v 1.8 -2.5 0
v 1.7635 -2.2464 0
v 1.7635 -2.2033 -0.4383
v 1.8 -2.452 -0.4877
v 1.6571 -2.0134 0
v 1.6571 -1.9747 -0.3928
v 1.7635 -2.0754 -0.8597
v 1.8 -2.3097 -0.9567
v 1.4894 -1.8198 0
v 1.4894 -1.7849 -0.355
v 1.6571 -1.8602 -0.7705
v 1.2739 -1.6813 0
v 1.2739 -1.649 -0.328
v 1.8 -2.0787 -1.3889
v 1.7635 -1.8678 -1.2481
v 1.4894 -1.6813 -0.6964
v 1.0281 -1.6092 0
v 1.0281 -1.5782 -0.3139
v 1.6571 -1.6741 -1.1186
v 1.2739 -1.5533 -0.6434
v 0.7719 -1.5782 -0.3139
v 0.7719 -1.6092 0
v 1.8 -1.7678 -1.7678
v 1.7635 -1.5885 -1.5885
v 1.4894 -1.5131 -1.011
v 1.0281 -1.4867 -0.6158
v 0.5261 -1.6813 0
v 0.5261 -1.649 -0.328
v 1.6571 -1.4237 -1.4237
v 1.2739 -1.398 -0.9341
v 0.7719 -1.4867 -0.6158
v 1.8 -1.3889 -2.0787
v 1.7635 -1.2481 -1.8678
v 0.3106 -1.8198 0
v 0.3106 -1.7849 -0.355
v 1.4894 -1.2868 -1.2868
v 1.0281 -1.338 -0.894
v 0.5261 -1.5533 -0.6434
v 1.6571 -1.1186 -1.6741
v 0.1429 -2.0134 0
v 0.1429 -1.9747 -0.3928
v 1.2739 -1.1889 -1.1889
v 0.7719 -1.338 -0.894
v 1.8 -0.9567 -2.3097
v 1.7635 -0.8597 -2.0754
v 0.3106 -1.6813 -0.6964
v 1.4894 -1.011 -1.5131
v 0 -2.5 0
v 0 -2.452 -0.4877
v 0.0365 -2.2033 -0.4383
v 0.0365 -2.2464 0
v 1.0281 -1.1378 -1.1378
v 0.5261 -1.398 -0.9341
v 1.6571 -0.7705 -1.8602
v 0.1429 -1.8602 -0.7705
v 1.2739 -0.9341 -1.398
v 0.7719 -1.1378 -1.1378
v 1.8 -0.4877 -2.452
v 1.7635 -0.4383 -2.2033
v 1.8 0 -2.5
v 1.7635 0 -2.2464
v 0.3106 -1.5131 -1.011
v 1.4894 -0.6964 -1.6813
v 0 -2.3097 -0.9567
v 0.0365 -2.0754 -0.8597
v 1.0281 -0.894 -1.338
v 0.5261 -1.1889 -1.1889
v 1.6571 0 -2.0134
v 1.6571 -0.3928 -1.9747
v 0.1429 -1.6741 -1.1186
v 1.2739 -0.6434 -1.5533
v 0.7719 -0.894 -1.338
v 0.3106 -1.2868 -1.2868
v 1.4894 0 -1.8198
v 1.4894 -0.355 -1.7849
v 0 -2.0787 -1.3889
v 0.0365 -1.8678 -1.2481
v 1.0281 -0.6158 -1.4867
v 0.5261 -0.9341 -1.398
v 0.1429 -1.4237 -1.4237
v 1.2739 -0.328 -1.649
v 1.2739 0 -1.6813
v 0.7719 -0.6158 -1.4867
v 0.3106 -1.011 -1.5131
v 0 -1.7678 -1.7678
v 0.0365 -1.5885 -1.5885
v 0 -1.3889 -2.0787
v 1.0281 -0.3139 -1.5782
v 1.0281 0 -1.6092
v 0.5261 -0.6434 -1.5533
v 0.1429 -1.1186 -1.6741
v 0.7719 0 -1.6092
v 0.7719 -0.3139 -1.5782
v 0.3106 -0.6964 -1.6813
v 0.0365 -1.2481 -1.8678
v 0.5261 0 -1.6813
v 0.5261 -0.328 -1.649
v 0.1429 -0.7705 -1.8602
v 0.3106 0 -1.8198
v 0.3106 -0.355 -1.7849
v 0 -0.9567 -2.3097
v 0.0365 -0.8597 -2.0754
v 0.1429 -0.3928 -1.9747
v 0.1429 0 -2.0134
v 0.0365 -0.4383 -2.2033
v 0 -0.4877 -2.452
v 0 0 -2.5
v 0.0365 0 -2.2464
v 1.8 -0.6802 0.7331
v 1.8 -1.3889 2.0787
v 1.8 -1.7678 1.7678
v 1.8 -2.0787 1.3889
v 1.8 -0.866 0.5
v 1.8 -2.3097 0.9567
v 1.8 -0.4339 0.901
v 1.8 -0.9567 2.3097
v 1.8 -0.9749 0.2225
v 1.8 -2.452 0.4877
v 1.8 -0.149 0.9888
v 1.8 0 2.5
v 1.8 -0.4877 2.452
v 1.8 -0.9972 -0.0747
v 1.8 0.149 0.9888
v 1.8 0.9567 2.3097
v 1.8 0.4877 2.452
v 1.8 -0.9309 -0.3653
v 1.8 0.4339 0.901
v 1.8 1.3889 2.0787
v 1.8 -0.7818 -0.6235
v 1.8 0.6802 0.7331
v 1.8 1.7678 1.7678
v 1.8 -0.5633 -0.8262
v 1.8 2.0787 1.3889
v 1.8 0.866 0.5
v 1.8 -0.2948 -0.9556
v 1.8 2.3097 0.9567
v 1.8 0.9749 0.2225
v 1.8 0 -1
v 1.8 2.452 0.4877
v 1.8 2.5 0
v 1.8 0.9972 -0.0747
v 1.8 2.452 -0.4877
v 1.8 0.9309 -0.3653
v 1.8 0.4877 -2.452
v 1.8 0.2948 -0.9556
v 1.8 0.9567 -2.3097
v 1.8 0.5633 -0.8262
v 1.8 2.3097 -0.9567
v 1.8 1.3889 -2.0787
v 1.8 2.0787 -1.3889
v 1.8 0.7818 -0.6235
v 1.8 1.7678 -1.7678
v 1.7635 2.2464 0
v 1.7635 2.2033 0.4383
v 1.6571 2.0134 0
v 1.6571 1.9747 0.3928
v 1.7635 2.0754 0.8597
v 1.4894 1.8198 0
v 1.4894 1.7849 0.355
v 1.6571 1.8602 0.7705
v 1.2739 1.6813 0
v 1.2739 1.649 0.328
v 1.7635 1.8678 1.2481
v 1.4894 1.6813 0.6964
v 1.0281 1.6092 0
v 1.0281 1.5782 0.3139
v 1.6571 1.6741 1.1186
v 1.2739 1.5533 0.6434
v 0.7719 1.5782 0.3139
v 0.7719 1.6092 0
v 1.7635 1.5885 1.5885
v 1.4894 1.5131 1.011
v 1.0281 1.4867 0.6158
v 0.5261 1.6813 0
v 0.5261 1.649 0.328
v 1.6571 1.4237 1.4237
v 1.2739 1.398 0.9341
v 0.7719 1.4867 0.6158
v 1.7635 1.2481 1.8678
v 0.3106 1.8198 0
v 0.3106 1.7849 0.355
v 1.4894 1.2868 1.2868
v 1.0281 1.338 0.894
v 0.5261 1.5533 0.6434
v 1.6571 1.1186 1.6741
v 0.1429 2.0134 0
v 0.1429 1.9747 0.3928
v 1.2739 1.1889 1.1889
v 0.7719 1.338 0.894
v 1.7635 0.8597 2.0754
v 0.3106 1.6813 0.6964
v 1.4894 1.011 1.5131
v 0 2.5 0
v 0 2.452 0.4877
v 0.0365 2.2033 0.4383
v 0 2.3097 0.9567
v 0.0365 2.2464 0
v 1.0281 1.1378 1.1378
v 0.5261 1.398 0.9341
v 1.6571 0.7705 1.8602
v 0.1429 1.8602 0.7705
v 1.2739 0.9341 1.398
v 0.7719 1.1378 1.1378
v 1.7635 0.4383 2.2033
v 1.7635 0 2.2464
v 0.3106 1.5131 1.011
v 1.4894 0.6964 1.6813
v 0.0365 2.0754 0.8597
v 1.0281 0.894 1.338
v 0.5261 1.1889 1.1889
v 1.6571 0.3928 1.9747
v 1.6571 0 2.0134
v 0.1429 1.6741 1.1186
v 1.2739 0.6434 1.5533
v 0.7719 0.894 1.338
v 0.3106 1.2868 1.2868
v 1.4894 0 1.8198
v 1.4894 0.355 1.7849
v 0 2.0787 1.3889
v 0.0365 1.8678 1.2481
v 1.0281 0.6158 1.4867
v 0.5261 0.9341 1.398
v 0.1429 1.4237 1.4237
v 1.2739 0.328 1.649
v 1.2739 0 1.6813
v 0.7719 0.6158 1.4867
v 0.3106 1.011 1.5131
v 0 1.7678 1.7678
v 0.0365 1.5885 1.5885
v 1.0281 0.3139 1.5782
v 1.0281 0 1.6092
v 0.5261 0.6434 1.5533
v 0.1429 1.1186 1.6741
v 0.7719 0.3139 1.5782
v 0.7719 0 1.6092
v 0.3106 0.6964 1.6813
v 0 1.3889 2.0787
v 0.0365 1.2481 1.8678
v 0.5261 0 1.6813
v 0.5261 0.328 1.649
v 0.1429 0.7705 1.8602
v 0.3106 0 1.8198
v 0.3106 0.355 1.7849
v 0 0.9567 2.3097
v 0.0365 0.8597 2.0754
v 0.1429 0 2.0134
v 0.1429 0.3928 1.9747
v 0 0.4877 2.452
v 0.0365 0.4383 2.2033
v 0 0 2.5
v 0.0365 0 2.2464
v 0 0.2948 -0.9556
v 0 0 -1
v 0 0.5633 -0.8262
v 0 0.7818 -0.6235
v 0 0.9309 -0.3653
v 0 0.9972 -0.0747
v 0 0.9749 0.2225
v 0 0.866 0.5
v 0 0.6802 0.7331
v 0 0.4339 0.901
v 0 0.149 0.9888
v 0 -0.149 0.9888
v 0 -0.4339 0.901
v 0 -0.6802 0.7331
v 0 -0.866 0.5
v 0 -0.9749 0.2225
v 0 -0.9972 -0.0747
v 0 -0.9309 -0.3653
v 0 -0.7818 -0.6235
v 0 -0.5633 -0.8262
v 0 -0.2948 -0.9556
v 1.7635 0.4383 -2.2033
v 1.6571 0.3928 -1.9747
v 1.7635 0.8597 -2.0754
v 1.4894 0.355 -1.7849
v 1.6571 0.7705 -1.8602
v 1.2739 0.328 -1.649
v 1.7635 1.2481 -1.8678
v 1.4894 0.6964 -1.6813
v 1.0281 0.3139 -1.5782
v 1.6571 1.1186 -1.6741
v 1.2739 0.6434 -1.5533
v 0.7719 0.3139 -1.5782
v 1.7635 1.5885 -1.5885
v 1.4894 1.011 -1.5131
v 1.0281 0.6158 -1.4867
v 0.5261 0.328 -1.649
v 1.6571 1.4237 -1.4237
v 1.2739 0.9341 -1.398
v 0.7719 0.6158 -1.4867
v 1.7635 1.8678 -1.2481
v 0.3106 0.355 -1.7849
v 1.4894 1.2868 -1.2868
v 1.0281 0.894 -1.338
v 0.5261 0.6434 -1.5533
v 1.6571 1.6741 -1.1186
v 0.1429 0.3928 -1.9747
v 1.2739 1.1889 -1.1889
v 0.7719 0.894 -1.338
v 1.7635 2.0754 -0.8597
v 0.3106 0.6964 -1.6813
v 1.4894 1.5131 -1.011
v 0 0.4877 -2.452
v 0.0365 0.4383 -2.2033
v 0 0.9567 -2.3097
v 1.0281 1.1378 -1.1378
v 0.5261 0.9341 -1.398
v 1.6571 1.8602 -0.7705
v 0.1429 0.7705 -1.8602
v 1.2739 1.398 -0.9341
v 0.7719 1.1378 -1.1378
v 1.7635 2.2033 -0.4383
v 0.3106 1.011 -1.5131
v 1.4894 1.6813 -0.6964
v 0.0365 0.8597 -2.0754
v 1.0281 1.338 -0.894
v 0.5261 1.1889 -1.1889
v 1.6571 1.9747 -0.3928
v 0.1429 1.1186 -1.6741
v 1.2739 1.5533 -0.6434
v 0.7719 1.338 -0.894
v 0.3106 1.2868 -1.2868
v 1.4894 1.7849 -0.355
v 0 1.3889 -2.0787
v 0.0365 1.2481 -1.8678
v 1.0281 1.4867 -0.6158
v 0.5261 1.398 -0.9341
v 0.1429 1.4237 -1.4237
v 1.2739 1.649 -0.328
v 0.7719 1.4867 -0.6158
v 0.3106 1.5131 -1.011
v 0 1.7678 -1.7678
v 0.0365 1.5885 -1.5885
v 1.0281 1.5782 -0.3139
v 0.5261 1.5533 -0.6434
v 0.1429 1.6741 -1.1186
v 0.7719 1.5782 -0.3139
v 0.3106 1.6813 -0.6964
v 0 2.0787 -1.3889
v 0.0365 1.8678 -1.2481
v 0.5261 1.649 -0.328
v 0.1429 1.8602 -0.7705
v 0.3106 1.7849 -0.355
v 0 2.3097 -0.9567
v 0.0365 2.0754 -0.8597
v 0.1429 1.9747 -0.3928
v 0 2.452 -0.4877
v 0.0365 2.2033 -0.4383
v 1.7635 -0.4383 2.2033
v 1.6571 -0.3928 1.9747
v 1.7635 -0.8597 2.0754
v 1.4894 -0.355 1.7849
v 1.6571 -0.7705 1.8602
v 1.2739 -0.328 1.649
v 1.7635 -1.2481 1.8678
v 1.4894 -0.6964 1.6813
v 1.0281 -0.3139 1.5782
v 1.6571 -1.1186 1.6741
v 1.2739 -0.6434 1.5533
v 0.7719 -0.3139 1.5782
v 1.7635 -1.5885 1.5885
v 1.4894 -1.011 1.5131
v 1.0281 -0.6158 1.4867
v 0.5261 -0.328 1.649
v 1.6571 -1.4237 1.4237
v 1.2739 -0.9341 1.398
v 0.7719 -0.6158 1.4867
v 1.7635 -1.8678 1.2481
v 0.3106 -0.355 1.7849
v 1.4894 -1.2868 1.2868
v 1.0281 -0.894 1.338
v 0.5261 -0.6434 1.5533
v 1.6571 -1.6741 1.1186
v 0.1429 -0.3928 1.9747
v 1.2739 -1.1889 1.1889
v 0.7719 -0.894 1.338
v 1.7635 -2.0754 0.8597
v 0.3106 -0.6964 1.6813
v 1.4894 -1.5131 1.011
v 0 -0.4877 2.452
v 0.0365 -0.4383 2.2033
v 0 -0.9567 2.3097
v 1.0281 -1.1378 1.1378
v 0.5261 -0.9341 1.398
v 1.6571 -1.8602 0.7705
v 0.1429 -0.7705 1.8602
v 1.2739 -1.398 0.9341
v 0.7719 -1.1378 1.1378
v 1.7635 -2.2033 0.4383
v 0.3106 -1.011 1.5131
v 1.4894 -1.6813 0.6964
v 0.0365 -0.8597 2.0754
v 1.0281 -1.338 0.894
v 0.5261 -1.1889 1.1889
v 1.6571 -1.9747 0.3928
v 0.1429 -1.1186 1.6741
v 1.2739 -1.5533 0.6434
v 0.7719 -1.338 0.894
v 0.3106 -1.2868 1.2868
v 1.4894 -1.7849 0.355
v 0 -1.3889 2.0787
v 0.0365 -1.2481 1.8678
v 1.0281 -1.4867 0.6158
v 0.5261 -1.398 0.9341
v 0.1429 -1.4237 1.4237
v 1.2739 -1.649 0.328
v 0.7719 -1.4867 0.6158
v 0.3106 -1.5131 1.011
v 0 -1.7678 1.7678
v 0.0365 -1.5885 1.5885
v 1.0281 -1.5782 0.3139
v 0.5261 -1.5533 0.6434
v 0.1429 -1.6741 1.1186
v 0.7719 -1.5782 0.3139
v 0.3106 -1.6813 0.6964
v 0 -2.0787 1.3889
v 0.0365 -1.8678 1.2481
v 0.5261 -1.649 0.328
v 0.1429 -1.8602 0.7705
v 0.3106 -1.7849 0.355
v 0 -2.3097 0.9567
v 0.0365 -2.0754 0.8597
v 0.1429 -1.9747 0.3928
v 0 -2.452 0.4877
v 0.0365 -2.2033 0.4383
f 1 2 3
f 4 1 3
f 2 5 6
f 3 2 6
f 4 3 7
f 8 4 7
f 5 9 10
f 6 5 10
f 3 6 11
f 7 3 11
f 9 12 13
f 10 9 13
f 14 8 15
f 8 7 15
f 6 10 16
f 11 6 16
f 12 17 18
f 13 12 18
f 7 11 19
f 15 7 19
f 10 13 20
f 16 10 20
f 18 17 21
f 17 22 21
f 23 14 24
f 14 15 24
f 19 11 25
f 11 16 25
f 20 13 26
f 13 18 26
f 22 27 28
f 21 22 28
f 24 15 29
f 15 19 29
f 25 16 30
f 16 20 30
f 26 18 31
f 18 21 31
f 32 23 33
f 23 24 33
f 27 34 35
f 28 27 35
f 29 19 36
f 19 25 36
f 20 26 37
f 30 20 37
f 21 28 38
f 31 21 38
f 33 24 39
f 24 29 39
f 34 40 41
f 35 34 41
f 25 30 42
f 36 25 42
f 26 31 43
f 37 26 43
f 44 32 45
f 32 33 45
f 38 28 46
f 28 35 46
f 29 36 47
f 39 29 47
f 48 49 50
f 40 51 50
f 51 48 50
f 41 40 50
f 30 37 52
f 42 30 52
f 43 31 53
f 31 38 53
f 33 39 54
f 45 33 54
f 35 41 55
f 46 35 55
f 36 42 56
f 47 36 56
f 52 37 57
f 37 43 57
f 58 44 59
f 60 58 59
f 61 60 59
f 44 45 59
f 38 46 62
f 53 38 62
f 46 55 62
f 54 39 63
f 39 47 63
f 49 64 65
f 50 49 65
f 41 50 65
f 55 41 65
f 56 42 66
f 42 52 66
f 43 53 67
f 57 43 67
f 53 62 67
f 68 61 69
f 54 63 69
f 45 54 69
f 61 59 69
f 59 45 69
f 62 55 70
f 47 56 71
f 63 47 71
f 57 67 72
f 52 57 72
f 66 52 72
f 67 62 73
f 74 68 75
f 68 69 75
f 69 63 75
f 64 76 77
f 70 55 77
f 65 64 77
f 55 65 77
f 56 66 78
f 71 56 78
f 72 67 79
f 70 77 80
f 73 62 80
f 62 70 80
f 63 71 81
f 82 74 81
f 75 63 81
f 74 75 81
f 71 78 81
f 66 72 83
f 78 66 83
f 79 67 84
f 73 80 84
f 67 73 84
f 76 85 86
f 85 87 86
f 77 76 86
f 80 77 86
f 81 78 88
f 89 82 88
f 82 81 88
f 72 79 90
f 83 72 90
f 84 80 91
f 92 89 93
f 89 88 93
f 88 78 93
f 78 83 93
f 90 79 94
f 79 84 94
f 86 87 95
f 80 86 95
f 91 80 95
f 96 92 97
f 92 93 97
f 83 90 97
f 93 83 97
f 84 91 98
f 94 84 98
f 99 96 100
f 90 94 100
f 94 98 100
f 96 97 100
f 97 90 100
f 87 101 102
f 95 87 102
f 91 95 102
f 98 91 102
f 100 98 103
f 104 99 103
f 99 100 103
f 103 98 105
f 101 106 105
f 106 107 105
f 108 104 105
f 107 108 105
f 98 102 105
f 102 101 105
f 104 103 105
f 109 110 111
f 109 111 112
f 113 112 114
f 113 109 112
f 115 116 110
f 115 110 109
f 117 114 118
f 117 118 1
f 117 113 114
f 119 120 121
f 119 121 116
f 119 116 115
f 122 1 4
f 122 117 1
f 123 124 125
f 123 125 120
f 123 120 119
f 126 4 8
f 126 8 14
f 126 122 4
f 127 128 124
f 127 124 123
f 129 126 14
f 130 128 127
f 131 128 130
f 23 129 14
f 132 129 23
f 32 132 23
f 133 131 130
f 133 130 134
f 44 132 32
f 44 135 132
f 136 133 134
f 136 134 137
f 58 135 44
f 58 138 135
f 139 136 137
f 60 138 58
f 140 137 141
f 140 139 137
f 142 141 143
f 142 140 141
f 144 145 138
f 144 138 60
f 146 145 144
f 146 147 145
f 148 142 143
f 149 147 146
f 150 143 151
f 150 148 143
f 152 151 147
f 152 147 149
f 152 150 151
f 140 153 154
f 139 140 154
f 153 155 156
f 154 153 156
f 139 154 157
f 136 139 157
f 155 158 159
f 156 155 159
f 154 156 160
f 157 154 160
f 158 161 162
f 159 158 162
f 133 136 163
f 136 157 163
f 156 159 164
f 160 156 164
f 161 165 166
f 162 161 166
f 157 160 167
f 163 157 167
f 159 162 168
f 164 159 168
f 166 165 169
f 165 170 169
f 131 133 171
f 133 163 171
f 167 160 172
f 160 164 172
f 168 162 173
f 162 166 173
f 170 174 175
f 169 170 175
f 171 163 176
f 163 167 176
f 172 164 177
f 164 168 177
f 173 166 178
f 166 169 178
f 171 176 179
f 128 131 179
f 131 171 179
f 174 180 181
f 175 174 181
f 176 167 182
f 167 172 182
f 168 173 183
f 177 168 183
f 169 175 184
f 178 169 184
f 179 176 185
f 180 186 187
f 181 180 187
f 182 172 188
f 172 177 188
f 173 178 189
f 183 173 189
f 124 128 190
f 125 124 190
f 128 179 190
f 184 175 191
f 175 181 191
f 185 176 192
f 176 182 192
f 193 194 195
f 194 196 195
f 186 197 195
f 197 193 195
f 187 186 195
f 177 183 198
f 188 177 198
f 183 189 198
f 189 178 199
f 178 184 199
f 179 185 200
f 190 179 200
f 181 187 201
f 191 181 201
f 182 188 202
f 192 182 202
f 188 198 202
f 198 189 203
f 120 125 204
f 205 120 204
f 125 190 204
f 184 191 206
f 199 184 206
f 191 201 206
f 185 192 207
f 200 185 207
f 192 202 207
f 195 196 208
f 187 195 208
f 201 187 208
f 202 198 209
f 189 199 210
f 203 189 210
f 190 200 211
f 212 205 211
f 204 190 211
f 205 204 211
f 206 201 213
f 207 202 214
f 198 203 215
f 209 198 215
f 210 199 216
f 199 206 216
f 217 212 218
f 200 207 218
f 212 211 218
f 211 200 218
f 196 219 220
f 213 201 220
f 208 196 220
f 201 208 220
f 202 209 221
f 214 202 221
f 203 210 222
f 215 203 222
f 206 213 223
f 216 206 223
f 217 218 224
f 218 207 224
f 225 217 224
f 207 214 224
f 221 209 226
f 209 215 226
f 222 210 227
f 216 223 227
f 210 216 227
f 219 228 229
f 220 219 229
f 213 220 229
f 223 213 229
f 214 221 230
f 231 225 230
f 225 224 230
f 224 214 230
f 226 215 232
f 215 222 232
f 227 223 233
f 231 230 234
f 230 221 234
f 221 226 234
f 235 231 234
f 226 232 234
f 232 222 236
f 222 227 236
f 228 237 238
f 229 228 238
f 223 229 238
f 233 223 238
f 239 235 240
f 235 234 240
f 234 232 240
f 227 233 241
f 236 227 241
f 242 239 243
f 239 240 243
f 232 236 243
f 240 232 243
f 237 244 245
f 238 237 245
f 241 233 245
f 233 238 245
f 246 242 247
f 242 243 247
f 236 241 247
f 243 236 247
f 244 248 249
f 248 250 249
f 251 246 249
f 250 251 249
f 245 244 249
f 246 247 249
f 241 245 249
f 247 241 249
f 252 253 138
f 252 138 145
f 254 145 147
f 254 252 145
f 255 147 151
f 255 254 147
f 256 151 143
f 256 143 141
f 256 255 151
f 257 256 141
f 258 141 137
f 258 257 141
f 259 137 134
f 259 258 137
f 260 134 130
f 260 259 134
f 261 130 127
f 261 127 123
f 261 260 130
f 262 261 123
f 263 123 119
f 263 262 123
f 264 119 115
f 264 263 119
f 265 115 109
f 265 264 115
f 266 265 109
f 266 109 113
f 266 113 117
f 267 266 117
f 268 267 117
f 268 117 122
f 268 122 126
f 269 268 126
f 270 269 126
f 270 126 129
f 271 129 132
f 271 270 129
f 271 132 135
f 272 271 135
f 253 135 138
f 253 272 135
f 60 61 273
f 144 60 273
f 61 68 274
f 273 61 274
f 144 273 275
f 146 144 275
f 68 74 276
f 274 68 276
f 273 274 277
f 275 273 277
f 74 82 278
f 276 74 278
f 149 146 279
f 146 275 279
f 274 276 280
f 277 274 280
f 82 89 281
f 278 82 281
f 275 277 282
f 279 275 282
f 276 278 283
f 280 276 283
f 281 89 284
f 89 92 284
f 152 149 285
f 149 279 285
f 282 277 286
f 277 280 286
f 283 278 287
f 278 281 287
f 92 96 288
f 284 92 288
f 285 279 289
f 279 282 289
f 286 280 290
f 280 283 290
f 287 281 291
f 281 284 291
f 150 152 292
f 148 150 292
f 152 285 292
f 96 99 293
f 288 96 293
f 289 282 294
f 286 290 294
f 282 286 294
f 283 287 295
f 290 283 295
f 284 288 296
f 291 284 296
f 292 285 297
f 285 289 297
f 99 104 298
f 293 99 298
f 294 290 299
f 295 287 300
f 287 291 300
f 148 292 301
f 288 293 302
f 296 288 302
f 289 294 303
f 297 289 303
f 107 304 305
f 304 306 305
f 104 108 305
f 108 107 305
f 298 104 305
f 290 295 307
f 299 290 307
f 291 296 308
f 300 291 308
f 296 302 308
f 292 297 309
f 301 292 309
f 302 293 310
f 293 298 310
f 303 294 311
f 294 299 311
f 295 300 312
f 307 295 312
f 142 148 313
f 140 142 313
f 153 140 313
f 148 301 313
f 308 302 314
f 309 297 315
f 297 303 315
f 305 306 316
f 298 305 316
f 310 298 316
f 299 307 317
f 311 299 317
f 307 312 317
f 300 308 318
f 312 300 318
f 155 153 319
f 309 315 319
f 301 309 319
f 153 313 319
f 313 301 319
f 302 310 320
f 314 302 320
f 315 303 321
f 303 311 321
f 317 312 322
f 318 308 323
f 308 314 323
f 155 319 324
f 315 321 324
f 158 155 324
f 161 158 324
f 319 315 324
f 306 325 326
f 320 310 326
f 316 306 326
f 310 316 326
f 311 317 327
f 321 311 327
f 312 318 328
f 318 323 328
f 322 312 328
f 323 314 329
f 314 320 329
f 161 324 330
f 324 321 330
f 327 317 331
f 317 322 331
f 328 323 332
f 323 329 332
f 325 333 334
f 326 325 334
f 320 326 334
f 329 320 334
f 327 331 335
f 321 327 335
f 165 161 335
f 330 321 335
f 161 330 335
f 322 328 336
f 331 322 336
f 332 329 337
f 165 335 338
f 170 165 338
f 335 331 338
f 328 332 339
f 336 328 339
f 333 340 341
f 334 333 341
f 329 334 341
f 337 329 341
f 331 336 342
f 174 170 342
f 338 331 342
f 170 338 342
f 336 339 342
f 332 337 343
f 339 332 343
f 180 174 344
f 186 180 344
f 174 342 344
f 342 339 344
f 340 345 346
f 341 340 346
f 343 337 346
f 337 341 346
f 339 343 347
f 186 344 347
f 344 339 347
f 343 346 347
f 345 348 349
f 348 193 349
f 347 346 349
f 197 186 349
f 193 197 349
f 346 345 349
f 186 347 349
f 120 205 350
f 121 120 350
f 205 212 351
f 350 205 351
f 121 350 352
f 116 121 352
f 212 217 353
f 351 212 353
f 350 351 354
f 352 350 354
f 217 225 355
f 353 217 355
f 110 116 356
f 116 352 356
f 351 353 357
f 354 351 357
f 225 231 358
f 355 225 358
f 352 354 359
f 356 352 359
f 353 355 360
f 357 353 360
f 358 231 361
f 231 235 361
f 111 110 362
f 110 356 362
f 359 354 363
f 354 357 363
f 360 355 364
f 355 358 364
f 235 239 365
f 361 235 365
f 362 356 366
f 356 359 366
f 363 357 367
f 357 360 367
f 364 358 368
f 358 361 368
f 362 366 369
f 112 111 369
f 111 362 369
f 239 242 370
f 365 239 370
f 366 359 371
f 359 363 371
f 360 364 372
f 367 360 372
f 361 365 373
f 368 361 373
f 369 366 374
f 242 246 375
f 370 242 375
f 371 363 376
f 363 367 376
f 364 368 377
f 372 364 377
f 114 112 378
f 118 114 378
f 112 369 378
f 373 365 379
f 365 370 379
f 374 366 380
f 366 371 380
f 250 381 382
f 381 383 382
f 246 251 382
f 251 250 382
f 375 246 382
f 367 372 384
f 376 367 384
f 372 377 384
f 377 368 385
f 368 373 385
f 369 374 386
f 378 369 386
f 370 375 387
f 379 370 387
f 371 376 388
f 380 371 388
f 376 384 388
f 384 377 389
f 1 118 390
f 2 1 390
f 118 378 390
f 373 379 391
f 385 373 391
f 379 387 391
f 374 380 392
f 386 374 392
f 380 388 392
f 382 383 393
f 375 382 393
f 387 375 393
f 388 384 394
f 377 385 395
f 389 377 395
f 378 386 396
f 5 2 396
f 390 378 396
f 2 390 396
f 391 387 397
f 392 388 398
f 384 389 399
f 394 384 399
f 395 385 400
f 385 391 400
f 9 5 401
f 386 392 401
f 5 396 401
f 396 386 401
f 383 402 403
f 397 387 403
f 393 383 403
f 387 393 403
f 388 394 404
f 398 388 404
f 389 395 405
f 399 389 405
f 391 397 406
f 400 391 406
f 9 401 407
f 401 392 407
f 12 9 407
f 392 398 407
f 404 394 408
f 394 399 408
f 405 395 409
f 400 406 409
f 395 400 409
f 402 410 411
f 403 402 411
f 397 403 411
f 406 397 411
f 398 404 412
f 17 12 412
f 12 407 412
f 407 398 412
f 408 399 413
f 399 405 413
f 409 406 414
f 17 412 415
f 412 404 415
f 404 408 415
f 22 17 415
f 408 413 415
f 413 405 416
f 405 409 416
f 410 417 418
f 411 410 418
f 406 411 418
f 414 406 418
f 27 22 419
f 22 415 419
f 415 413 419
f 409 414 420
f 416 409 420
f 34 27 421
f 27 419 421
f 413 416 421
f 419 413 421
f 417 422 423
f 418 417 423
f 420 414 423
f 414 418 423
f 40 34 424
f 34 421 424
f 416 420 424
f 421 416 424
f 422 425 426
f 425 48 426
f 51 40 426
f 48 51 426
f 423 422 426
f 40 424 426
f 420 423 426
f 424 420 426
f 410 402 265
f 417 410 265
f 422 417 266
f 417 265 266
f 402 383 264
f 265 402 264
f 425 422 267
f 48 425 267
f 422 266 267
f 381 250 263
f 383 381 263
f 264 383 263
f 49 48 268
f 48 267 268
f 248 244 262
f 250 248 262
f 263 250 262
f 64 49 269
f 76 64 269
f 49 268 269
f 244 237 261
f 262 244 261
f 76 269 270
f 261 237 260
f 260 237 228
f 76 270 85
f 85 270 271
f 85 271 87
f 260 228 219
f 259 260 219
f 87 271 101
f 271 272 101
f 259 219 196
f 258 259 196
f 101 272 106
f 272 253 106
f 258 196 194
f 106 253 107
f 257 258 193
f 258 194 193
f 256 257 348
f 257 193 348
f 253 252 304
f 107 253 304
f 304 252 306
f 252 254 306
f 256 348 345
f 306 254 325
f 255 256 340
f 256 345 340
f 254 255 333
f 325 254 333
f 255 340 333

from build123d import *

# Parameters (mm, degrees)
SKETCH1_R           = 2.5
SKETCH1_R_2         = 1
BOSS_EXTRUDE1_DEPTH = 1.8


with BuildPart() as part:
    # Sketch1 → Boss-Extrude1 (new body)
    with BuildSketch(Plane(origin=(0, 0, 0), x_dir=(0, 0, -1), z_dir=(1, 0, 0))):
        Circle(SKETCH1_R)
        Circle(SKETCH1_R_2, mode=Mode.SUBTRACT)
    extrude(amount=BOSS_EXTRUDE1_DEPTH)

    # Cut-Sweep5: sweep along a curve in space
    with BuildLine() as cut_sweep5_path:
        ThreePointArc((0, 0, -2.5), (0, 1.767766953, -1.767766953), (0, 2.5, 0))
        ThreePointArc((0, 2.5, 0), (0, 1.767766953, 1.767766953), (0, 0, 2.5))
        ThreePointArc((0, 0, 2.5), (0, -1.767766953, 1.767766953), (0, -2.5, 0))
        ThreePointArc((0, -2.5, 0), (0, -1.767766953, -1.767766953), (0, 0, -2.5))
    # Sketch21 → Cut-Sweep5 (sweep, cut)
    with BuildSketch(Plane.XY):
        with BuildLine():
            Line((0, 2.5), (1.8, 2.5))
            ThreePointArc((1.8, 2.5), (0.9, 1.6), (0, 2.5))
        make_face()
    sweep(path=cut_sweep5_path.line, mode=Mode.SUBTRACT)


solid = part.part
